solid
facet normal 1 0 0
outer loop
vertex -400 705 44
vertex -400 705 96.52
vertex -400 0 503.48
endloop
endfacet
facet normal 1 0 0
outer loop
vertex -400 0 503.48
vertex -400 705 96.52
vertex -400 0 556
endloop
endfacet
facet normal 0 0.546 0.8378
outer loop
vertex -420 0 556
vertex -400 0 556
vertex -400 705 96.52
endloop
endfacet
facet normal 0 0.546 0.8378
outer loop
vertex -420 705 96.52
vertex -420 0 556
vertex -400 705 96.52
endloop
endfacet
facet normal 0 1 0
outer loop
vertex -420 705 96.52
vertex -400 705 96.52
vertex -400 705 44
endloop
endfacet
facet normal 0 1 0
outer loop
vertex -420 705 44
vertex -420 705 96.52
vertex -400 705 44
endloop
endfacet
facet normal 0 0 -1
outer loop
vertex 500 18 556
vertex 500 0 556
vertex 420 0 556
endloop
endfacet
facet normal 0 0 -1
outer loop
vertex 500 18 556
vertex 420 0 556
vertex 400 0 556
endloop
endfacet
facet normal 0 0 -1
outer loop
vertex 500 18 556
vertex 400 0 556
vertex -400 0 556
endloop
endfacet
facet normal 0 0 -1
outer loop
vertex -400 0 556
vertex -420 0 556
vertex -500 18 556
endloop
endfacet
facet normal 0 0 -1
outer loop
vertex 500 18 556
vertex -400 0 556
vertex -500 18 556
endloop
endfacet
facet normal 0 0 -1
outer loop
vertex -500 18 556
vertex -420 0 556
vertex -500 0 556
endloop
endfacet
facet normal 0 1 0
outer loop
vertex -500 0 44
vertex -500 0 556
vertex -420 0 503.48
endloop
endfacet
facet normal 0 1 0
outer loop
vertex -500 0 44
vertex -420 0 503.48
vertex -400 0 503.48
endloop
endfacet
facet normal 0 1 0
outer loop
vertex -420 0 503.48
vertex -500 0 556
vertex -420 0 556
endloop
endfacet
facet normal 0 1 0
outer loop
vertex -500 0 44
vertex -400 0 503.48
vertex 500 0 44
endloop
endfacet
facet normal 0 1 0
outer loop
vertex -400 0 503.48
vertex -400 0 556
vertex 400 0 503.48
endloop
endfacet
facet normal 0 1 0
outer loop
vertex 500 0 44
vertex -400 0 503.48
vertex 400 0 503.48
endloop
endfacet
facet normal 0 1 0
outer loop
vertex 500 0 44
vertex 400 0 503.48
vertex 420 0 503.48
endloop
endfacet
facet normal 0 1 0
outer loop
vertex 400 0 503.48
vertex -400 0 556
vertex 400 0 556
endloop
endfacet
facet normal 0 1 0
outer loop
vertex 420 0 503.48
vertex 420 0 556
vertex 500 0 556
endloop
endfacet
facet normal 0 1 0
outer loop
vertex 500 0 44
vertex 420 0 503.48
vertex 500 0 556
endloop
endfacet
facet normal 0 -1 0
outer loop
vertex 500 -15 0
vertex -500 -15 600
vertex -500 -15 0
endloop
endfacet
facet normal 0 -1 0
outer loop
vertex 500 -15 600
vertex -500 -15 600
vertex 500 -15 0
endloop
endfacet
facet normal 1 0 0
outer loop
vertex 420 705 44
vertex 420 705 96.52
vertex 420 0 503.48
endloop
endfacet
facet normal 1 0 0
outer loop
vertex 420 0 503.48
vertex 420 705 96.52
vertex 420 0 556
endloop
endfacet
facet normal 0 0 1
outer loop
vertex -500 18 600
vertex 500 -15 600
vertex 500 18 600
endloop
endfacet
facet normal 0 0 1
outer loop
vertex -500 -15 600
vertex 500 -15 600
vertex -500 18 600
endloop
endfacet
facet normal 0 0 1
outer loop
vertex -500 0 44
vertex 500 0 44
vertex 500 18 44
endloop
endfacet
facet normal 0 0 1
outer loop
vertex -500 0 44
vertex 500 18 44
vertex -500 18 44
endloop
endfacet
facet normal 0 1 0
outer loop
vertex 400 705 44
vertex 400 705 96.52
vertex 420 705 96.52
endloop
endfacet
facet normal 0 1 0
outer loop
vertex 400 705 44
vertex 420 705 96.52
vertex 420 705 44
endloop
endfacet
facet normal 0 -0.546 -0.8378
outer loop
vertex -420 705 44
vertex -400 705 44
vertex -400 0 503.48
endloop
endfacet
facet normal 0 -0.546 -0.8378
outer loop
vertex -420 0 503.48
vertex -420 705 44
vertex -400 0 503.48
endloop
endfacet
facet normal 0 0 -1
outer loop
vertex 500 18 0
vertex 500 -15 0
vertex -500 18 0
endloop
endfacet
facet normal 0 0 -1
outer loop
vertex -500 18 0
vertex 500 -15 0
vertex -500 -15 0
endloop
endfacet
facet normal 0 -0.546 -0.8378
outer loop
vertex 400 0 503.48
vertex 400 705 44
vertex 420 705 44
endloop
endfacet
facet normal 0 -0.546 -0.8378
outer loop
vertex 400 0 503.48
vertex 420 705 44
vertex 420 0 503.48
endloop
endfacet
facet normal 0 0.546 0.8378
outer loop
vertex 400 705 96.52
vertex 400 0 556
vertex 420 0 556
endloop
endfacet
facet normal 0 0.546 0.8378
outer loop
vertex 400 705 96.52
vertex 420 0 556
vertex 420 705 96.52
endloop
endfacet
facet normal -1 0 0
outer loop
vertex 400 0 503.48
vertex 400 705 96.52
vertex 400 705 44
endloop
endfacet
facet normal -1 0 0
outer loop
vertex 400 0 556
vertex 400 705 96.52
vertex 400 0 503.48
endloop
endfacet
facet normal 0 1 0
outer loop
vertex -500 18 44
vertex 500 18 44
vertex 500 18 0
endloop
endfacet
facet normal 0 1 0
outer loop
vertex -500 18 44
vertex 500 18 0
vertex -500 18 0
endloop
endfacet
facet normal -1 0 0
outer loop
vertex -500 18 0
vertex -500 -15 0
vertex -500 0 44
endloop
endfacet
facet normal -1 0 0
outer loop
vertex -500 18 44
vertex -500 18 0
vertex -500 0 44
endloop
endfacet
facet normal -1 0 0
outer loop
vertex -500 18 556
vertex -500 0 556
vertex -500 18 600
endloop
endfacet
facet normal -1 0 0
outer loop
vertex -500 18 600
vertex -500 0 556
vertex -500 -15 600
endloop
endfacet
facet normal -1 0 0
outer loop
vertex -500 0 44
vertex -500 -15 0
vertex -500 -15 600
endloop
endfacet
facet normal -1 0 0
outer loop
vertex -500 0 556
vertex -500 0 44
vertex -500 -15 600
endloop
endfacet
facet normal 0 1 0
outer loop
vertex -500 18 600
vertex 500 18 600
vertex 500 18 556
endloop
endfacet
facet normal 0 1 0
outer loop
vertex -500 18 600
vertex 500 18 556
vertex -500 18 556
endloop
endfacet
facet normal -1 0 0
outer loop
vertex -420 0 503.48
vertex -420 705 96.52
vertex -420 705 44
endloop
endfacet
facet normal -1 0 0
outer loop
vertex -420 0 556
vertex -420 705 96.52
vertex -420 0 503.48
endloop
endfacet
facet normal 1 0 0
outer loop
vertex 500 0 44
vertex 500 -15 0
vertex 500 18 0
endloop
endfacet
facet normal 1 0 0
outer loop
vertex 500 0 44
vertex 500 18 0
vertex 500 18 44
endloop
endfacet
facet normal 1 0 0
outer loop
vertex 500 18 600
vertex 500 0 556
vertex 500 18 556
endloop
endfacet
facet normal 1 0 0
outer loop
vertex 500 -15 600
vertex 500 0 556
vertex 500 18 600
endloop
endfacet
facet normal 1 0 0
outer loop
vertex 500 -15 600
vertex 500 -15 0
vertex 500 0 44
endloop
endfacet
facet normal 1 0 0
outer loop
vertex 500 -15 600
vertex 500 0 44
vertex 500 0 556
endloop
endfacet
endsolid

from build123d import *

# Parameters (mm, degrees)
F0_W     = 1000
F0_H     = 600
F1_DEPTH = 15
F3_W     = 1000
F3_H     = 44
F4_DEPTH = 18
F5_W     = 1000
F5_H     = 44
F6_DEPTH = 18
F9_DEPTH = 20


with BuildPart() as f1:
    # F0 (on Front) → F1 (new body)
    with BuildSketch(Plane.XZ):
        with Locations((0, 300)):
            Rectangle(F0_W, F0_H)
    extrude(amount=F1_DEPTH)

    # F3 (on offset) → F4 (join)
    with BuildSketch(Plane(origin=(0, 0, 0), x_dir=(-1, 0, 0), z_dir=(0, 1, 0))):
        with Locations((0, 22)):
            Rectangle(F3_W, F3_H)
    extrude(amount=F4_DEPTH)

    # F5 (on offset) → F6 (join)
    with BuildSketch(Plane(origin=(0, 0, 0), x_dir=(-1, 0, 0), z_dir=(0, 1, 0))):
        with Locations((0, 578)):
            Rectangle(F5_W, F5_H)
    extrude(amount=F6_DEPTH)

    # F8 (on offset) → F9 (join)
    with BuildSketch(Plane(origin=(-400, 0, 0), x_dir=(0, -1, 0), z_dir=(-1, 0, 0))):
        Polygon((0, 503.4799401049), (0, 556), (-705, 96.5200598951), (-705, 44), align=None)
    extrude(amount=F9_DEPTH)

    # F10: F1 across plane


with BuildPart() as f1_1:
    add(f1.part)
    add(f1.part.mirror(Plane.YZ))


solid = f1_1.part
